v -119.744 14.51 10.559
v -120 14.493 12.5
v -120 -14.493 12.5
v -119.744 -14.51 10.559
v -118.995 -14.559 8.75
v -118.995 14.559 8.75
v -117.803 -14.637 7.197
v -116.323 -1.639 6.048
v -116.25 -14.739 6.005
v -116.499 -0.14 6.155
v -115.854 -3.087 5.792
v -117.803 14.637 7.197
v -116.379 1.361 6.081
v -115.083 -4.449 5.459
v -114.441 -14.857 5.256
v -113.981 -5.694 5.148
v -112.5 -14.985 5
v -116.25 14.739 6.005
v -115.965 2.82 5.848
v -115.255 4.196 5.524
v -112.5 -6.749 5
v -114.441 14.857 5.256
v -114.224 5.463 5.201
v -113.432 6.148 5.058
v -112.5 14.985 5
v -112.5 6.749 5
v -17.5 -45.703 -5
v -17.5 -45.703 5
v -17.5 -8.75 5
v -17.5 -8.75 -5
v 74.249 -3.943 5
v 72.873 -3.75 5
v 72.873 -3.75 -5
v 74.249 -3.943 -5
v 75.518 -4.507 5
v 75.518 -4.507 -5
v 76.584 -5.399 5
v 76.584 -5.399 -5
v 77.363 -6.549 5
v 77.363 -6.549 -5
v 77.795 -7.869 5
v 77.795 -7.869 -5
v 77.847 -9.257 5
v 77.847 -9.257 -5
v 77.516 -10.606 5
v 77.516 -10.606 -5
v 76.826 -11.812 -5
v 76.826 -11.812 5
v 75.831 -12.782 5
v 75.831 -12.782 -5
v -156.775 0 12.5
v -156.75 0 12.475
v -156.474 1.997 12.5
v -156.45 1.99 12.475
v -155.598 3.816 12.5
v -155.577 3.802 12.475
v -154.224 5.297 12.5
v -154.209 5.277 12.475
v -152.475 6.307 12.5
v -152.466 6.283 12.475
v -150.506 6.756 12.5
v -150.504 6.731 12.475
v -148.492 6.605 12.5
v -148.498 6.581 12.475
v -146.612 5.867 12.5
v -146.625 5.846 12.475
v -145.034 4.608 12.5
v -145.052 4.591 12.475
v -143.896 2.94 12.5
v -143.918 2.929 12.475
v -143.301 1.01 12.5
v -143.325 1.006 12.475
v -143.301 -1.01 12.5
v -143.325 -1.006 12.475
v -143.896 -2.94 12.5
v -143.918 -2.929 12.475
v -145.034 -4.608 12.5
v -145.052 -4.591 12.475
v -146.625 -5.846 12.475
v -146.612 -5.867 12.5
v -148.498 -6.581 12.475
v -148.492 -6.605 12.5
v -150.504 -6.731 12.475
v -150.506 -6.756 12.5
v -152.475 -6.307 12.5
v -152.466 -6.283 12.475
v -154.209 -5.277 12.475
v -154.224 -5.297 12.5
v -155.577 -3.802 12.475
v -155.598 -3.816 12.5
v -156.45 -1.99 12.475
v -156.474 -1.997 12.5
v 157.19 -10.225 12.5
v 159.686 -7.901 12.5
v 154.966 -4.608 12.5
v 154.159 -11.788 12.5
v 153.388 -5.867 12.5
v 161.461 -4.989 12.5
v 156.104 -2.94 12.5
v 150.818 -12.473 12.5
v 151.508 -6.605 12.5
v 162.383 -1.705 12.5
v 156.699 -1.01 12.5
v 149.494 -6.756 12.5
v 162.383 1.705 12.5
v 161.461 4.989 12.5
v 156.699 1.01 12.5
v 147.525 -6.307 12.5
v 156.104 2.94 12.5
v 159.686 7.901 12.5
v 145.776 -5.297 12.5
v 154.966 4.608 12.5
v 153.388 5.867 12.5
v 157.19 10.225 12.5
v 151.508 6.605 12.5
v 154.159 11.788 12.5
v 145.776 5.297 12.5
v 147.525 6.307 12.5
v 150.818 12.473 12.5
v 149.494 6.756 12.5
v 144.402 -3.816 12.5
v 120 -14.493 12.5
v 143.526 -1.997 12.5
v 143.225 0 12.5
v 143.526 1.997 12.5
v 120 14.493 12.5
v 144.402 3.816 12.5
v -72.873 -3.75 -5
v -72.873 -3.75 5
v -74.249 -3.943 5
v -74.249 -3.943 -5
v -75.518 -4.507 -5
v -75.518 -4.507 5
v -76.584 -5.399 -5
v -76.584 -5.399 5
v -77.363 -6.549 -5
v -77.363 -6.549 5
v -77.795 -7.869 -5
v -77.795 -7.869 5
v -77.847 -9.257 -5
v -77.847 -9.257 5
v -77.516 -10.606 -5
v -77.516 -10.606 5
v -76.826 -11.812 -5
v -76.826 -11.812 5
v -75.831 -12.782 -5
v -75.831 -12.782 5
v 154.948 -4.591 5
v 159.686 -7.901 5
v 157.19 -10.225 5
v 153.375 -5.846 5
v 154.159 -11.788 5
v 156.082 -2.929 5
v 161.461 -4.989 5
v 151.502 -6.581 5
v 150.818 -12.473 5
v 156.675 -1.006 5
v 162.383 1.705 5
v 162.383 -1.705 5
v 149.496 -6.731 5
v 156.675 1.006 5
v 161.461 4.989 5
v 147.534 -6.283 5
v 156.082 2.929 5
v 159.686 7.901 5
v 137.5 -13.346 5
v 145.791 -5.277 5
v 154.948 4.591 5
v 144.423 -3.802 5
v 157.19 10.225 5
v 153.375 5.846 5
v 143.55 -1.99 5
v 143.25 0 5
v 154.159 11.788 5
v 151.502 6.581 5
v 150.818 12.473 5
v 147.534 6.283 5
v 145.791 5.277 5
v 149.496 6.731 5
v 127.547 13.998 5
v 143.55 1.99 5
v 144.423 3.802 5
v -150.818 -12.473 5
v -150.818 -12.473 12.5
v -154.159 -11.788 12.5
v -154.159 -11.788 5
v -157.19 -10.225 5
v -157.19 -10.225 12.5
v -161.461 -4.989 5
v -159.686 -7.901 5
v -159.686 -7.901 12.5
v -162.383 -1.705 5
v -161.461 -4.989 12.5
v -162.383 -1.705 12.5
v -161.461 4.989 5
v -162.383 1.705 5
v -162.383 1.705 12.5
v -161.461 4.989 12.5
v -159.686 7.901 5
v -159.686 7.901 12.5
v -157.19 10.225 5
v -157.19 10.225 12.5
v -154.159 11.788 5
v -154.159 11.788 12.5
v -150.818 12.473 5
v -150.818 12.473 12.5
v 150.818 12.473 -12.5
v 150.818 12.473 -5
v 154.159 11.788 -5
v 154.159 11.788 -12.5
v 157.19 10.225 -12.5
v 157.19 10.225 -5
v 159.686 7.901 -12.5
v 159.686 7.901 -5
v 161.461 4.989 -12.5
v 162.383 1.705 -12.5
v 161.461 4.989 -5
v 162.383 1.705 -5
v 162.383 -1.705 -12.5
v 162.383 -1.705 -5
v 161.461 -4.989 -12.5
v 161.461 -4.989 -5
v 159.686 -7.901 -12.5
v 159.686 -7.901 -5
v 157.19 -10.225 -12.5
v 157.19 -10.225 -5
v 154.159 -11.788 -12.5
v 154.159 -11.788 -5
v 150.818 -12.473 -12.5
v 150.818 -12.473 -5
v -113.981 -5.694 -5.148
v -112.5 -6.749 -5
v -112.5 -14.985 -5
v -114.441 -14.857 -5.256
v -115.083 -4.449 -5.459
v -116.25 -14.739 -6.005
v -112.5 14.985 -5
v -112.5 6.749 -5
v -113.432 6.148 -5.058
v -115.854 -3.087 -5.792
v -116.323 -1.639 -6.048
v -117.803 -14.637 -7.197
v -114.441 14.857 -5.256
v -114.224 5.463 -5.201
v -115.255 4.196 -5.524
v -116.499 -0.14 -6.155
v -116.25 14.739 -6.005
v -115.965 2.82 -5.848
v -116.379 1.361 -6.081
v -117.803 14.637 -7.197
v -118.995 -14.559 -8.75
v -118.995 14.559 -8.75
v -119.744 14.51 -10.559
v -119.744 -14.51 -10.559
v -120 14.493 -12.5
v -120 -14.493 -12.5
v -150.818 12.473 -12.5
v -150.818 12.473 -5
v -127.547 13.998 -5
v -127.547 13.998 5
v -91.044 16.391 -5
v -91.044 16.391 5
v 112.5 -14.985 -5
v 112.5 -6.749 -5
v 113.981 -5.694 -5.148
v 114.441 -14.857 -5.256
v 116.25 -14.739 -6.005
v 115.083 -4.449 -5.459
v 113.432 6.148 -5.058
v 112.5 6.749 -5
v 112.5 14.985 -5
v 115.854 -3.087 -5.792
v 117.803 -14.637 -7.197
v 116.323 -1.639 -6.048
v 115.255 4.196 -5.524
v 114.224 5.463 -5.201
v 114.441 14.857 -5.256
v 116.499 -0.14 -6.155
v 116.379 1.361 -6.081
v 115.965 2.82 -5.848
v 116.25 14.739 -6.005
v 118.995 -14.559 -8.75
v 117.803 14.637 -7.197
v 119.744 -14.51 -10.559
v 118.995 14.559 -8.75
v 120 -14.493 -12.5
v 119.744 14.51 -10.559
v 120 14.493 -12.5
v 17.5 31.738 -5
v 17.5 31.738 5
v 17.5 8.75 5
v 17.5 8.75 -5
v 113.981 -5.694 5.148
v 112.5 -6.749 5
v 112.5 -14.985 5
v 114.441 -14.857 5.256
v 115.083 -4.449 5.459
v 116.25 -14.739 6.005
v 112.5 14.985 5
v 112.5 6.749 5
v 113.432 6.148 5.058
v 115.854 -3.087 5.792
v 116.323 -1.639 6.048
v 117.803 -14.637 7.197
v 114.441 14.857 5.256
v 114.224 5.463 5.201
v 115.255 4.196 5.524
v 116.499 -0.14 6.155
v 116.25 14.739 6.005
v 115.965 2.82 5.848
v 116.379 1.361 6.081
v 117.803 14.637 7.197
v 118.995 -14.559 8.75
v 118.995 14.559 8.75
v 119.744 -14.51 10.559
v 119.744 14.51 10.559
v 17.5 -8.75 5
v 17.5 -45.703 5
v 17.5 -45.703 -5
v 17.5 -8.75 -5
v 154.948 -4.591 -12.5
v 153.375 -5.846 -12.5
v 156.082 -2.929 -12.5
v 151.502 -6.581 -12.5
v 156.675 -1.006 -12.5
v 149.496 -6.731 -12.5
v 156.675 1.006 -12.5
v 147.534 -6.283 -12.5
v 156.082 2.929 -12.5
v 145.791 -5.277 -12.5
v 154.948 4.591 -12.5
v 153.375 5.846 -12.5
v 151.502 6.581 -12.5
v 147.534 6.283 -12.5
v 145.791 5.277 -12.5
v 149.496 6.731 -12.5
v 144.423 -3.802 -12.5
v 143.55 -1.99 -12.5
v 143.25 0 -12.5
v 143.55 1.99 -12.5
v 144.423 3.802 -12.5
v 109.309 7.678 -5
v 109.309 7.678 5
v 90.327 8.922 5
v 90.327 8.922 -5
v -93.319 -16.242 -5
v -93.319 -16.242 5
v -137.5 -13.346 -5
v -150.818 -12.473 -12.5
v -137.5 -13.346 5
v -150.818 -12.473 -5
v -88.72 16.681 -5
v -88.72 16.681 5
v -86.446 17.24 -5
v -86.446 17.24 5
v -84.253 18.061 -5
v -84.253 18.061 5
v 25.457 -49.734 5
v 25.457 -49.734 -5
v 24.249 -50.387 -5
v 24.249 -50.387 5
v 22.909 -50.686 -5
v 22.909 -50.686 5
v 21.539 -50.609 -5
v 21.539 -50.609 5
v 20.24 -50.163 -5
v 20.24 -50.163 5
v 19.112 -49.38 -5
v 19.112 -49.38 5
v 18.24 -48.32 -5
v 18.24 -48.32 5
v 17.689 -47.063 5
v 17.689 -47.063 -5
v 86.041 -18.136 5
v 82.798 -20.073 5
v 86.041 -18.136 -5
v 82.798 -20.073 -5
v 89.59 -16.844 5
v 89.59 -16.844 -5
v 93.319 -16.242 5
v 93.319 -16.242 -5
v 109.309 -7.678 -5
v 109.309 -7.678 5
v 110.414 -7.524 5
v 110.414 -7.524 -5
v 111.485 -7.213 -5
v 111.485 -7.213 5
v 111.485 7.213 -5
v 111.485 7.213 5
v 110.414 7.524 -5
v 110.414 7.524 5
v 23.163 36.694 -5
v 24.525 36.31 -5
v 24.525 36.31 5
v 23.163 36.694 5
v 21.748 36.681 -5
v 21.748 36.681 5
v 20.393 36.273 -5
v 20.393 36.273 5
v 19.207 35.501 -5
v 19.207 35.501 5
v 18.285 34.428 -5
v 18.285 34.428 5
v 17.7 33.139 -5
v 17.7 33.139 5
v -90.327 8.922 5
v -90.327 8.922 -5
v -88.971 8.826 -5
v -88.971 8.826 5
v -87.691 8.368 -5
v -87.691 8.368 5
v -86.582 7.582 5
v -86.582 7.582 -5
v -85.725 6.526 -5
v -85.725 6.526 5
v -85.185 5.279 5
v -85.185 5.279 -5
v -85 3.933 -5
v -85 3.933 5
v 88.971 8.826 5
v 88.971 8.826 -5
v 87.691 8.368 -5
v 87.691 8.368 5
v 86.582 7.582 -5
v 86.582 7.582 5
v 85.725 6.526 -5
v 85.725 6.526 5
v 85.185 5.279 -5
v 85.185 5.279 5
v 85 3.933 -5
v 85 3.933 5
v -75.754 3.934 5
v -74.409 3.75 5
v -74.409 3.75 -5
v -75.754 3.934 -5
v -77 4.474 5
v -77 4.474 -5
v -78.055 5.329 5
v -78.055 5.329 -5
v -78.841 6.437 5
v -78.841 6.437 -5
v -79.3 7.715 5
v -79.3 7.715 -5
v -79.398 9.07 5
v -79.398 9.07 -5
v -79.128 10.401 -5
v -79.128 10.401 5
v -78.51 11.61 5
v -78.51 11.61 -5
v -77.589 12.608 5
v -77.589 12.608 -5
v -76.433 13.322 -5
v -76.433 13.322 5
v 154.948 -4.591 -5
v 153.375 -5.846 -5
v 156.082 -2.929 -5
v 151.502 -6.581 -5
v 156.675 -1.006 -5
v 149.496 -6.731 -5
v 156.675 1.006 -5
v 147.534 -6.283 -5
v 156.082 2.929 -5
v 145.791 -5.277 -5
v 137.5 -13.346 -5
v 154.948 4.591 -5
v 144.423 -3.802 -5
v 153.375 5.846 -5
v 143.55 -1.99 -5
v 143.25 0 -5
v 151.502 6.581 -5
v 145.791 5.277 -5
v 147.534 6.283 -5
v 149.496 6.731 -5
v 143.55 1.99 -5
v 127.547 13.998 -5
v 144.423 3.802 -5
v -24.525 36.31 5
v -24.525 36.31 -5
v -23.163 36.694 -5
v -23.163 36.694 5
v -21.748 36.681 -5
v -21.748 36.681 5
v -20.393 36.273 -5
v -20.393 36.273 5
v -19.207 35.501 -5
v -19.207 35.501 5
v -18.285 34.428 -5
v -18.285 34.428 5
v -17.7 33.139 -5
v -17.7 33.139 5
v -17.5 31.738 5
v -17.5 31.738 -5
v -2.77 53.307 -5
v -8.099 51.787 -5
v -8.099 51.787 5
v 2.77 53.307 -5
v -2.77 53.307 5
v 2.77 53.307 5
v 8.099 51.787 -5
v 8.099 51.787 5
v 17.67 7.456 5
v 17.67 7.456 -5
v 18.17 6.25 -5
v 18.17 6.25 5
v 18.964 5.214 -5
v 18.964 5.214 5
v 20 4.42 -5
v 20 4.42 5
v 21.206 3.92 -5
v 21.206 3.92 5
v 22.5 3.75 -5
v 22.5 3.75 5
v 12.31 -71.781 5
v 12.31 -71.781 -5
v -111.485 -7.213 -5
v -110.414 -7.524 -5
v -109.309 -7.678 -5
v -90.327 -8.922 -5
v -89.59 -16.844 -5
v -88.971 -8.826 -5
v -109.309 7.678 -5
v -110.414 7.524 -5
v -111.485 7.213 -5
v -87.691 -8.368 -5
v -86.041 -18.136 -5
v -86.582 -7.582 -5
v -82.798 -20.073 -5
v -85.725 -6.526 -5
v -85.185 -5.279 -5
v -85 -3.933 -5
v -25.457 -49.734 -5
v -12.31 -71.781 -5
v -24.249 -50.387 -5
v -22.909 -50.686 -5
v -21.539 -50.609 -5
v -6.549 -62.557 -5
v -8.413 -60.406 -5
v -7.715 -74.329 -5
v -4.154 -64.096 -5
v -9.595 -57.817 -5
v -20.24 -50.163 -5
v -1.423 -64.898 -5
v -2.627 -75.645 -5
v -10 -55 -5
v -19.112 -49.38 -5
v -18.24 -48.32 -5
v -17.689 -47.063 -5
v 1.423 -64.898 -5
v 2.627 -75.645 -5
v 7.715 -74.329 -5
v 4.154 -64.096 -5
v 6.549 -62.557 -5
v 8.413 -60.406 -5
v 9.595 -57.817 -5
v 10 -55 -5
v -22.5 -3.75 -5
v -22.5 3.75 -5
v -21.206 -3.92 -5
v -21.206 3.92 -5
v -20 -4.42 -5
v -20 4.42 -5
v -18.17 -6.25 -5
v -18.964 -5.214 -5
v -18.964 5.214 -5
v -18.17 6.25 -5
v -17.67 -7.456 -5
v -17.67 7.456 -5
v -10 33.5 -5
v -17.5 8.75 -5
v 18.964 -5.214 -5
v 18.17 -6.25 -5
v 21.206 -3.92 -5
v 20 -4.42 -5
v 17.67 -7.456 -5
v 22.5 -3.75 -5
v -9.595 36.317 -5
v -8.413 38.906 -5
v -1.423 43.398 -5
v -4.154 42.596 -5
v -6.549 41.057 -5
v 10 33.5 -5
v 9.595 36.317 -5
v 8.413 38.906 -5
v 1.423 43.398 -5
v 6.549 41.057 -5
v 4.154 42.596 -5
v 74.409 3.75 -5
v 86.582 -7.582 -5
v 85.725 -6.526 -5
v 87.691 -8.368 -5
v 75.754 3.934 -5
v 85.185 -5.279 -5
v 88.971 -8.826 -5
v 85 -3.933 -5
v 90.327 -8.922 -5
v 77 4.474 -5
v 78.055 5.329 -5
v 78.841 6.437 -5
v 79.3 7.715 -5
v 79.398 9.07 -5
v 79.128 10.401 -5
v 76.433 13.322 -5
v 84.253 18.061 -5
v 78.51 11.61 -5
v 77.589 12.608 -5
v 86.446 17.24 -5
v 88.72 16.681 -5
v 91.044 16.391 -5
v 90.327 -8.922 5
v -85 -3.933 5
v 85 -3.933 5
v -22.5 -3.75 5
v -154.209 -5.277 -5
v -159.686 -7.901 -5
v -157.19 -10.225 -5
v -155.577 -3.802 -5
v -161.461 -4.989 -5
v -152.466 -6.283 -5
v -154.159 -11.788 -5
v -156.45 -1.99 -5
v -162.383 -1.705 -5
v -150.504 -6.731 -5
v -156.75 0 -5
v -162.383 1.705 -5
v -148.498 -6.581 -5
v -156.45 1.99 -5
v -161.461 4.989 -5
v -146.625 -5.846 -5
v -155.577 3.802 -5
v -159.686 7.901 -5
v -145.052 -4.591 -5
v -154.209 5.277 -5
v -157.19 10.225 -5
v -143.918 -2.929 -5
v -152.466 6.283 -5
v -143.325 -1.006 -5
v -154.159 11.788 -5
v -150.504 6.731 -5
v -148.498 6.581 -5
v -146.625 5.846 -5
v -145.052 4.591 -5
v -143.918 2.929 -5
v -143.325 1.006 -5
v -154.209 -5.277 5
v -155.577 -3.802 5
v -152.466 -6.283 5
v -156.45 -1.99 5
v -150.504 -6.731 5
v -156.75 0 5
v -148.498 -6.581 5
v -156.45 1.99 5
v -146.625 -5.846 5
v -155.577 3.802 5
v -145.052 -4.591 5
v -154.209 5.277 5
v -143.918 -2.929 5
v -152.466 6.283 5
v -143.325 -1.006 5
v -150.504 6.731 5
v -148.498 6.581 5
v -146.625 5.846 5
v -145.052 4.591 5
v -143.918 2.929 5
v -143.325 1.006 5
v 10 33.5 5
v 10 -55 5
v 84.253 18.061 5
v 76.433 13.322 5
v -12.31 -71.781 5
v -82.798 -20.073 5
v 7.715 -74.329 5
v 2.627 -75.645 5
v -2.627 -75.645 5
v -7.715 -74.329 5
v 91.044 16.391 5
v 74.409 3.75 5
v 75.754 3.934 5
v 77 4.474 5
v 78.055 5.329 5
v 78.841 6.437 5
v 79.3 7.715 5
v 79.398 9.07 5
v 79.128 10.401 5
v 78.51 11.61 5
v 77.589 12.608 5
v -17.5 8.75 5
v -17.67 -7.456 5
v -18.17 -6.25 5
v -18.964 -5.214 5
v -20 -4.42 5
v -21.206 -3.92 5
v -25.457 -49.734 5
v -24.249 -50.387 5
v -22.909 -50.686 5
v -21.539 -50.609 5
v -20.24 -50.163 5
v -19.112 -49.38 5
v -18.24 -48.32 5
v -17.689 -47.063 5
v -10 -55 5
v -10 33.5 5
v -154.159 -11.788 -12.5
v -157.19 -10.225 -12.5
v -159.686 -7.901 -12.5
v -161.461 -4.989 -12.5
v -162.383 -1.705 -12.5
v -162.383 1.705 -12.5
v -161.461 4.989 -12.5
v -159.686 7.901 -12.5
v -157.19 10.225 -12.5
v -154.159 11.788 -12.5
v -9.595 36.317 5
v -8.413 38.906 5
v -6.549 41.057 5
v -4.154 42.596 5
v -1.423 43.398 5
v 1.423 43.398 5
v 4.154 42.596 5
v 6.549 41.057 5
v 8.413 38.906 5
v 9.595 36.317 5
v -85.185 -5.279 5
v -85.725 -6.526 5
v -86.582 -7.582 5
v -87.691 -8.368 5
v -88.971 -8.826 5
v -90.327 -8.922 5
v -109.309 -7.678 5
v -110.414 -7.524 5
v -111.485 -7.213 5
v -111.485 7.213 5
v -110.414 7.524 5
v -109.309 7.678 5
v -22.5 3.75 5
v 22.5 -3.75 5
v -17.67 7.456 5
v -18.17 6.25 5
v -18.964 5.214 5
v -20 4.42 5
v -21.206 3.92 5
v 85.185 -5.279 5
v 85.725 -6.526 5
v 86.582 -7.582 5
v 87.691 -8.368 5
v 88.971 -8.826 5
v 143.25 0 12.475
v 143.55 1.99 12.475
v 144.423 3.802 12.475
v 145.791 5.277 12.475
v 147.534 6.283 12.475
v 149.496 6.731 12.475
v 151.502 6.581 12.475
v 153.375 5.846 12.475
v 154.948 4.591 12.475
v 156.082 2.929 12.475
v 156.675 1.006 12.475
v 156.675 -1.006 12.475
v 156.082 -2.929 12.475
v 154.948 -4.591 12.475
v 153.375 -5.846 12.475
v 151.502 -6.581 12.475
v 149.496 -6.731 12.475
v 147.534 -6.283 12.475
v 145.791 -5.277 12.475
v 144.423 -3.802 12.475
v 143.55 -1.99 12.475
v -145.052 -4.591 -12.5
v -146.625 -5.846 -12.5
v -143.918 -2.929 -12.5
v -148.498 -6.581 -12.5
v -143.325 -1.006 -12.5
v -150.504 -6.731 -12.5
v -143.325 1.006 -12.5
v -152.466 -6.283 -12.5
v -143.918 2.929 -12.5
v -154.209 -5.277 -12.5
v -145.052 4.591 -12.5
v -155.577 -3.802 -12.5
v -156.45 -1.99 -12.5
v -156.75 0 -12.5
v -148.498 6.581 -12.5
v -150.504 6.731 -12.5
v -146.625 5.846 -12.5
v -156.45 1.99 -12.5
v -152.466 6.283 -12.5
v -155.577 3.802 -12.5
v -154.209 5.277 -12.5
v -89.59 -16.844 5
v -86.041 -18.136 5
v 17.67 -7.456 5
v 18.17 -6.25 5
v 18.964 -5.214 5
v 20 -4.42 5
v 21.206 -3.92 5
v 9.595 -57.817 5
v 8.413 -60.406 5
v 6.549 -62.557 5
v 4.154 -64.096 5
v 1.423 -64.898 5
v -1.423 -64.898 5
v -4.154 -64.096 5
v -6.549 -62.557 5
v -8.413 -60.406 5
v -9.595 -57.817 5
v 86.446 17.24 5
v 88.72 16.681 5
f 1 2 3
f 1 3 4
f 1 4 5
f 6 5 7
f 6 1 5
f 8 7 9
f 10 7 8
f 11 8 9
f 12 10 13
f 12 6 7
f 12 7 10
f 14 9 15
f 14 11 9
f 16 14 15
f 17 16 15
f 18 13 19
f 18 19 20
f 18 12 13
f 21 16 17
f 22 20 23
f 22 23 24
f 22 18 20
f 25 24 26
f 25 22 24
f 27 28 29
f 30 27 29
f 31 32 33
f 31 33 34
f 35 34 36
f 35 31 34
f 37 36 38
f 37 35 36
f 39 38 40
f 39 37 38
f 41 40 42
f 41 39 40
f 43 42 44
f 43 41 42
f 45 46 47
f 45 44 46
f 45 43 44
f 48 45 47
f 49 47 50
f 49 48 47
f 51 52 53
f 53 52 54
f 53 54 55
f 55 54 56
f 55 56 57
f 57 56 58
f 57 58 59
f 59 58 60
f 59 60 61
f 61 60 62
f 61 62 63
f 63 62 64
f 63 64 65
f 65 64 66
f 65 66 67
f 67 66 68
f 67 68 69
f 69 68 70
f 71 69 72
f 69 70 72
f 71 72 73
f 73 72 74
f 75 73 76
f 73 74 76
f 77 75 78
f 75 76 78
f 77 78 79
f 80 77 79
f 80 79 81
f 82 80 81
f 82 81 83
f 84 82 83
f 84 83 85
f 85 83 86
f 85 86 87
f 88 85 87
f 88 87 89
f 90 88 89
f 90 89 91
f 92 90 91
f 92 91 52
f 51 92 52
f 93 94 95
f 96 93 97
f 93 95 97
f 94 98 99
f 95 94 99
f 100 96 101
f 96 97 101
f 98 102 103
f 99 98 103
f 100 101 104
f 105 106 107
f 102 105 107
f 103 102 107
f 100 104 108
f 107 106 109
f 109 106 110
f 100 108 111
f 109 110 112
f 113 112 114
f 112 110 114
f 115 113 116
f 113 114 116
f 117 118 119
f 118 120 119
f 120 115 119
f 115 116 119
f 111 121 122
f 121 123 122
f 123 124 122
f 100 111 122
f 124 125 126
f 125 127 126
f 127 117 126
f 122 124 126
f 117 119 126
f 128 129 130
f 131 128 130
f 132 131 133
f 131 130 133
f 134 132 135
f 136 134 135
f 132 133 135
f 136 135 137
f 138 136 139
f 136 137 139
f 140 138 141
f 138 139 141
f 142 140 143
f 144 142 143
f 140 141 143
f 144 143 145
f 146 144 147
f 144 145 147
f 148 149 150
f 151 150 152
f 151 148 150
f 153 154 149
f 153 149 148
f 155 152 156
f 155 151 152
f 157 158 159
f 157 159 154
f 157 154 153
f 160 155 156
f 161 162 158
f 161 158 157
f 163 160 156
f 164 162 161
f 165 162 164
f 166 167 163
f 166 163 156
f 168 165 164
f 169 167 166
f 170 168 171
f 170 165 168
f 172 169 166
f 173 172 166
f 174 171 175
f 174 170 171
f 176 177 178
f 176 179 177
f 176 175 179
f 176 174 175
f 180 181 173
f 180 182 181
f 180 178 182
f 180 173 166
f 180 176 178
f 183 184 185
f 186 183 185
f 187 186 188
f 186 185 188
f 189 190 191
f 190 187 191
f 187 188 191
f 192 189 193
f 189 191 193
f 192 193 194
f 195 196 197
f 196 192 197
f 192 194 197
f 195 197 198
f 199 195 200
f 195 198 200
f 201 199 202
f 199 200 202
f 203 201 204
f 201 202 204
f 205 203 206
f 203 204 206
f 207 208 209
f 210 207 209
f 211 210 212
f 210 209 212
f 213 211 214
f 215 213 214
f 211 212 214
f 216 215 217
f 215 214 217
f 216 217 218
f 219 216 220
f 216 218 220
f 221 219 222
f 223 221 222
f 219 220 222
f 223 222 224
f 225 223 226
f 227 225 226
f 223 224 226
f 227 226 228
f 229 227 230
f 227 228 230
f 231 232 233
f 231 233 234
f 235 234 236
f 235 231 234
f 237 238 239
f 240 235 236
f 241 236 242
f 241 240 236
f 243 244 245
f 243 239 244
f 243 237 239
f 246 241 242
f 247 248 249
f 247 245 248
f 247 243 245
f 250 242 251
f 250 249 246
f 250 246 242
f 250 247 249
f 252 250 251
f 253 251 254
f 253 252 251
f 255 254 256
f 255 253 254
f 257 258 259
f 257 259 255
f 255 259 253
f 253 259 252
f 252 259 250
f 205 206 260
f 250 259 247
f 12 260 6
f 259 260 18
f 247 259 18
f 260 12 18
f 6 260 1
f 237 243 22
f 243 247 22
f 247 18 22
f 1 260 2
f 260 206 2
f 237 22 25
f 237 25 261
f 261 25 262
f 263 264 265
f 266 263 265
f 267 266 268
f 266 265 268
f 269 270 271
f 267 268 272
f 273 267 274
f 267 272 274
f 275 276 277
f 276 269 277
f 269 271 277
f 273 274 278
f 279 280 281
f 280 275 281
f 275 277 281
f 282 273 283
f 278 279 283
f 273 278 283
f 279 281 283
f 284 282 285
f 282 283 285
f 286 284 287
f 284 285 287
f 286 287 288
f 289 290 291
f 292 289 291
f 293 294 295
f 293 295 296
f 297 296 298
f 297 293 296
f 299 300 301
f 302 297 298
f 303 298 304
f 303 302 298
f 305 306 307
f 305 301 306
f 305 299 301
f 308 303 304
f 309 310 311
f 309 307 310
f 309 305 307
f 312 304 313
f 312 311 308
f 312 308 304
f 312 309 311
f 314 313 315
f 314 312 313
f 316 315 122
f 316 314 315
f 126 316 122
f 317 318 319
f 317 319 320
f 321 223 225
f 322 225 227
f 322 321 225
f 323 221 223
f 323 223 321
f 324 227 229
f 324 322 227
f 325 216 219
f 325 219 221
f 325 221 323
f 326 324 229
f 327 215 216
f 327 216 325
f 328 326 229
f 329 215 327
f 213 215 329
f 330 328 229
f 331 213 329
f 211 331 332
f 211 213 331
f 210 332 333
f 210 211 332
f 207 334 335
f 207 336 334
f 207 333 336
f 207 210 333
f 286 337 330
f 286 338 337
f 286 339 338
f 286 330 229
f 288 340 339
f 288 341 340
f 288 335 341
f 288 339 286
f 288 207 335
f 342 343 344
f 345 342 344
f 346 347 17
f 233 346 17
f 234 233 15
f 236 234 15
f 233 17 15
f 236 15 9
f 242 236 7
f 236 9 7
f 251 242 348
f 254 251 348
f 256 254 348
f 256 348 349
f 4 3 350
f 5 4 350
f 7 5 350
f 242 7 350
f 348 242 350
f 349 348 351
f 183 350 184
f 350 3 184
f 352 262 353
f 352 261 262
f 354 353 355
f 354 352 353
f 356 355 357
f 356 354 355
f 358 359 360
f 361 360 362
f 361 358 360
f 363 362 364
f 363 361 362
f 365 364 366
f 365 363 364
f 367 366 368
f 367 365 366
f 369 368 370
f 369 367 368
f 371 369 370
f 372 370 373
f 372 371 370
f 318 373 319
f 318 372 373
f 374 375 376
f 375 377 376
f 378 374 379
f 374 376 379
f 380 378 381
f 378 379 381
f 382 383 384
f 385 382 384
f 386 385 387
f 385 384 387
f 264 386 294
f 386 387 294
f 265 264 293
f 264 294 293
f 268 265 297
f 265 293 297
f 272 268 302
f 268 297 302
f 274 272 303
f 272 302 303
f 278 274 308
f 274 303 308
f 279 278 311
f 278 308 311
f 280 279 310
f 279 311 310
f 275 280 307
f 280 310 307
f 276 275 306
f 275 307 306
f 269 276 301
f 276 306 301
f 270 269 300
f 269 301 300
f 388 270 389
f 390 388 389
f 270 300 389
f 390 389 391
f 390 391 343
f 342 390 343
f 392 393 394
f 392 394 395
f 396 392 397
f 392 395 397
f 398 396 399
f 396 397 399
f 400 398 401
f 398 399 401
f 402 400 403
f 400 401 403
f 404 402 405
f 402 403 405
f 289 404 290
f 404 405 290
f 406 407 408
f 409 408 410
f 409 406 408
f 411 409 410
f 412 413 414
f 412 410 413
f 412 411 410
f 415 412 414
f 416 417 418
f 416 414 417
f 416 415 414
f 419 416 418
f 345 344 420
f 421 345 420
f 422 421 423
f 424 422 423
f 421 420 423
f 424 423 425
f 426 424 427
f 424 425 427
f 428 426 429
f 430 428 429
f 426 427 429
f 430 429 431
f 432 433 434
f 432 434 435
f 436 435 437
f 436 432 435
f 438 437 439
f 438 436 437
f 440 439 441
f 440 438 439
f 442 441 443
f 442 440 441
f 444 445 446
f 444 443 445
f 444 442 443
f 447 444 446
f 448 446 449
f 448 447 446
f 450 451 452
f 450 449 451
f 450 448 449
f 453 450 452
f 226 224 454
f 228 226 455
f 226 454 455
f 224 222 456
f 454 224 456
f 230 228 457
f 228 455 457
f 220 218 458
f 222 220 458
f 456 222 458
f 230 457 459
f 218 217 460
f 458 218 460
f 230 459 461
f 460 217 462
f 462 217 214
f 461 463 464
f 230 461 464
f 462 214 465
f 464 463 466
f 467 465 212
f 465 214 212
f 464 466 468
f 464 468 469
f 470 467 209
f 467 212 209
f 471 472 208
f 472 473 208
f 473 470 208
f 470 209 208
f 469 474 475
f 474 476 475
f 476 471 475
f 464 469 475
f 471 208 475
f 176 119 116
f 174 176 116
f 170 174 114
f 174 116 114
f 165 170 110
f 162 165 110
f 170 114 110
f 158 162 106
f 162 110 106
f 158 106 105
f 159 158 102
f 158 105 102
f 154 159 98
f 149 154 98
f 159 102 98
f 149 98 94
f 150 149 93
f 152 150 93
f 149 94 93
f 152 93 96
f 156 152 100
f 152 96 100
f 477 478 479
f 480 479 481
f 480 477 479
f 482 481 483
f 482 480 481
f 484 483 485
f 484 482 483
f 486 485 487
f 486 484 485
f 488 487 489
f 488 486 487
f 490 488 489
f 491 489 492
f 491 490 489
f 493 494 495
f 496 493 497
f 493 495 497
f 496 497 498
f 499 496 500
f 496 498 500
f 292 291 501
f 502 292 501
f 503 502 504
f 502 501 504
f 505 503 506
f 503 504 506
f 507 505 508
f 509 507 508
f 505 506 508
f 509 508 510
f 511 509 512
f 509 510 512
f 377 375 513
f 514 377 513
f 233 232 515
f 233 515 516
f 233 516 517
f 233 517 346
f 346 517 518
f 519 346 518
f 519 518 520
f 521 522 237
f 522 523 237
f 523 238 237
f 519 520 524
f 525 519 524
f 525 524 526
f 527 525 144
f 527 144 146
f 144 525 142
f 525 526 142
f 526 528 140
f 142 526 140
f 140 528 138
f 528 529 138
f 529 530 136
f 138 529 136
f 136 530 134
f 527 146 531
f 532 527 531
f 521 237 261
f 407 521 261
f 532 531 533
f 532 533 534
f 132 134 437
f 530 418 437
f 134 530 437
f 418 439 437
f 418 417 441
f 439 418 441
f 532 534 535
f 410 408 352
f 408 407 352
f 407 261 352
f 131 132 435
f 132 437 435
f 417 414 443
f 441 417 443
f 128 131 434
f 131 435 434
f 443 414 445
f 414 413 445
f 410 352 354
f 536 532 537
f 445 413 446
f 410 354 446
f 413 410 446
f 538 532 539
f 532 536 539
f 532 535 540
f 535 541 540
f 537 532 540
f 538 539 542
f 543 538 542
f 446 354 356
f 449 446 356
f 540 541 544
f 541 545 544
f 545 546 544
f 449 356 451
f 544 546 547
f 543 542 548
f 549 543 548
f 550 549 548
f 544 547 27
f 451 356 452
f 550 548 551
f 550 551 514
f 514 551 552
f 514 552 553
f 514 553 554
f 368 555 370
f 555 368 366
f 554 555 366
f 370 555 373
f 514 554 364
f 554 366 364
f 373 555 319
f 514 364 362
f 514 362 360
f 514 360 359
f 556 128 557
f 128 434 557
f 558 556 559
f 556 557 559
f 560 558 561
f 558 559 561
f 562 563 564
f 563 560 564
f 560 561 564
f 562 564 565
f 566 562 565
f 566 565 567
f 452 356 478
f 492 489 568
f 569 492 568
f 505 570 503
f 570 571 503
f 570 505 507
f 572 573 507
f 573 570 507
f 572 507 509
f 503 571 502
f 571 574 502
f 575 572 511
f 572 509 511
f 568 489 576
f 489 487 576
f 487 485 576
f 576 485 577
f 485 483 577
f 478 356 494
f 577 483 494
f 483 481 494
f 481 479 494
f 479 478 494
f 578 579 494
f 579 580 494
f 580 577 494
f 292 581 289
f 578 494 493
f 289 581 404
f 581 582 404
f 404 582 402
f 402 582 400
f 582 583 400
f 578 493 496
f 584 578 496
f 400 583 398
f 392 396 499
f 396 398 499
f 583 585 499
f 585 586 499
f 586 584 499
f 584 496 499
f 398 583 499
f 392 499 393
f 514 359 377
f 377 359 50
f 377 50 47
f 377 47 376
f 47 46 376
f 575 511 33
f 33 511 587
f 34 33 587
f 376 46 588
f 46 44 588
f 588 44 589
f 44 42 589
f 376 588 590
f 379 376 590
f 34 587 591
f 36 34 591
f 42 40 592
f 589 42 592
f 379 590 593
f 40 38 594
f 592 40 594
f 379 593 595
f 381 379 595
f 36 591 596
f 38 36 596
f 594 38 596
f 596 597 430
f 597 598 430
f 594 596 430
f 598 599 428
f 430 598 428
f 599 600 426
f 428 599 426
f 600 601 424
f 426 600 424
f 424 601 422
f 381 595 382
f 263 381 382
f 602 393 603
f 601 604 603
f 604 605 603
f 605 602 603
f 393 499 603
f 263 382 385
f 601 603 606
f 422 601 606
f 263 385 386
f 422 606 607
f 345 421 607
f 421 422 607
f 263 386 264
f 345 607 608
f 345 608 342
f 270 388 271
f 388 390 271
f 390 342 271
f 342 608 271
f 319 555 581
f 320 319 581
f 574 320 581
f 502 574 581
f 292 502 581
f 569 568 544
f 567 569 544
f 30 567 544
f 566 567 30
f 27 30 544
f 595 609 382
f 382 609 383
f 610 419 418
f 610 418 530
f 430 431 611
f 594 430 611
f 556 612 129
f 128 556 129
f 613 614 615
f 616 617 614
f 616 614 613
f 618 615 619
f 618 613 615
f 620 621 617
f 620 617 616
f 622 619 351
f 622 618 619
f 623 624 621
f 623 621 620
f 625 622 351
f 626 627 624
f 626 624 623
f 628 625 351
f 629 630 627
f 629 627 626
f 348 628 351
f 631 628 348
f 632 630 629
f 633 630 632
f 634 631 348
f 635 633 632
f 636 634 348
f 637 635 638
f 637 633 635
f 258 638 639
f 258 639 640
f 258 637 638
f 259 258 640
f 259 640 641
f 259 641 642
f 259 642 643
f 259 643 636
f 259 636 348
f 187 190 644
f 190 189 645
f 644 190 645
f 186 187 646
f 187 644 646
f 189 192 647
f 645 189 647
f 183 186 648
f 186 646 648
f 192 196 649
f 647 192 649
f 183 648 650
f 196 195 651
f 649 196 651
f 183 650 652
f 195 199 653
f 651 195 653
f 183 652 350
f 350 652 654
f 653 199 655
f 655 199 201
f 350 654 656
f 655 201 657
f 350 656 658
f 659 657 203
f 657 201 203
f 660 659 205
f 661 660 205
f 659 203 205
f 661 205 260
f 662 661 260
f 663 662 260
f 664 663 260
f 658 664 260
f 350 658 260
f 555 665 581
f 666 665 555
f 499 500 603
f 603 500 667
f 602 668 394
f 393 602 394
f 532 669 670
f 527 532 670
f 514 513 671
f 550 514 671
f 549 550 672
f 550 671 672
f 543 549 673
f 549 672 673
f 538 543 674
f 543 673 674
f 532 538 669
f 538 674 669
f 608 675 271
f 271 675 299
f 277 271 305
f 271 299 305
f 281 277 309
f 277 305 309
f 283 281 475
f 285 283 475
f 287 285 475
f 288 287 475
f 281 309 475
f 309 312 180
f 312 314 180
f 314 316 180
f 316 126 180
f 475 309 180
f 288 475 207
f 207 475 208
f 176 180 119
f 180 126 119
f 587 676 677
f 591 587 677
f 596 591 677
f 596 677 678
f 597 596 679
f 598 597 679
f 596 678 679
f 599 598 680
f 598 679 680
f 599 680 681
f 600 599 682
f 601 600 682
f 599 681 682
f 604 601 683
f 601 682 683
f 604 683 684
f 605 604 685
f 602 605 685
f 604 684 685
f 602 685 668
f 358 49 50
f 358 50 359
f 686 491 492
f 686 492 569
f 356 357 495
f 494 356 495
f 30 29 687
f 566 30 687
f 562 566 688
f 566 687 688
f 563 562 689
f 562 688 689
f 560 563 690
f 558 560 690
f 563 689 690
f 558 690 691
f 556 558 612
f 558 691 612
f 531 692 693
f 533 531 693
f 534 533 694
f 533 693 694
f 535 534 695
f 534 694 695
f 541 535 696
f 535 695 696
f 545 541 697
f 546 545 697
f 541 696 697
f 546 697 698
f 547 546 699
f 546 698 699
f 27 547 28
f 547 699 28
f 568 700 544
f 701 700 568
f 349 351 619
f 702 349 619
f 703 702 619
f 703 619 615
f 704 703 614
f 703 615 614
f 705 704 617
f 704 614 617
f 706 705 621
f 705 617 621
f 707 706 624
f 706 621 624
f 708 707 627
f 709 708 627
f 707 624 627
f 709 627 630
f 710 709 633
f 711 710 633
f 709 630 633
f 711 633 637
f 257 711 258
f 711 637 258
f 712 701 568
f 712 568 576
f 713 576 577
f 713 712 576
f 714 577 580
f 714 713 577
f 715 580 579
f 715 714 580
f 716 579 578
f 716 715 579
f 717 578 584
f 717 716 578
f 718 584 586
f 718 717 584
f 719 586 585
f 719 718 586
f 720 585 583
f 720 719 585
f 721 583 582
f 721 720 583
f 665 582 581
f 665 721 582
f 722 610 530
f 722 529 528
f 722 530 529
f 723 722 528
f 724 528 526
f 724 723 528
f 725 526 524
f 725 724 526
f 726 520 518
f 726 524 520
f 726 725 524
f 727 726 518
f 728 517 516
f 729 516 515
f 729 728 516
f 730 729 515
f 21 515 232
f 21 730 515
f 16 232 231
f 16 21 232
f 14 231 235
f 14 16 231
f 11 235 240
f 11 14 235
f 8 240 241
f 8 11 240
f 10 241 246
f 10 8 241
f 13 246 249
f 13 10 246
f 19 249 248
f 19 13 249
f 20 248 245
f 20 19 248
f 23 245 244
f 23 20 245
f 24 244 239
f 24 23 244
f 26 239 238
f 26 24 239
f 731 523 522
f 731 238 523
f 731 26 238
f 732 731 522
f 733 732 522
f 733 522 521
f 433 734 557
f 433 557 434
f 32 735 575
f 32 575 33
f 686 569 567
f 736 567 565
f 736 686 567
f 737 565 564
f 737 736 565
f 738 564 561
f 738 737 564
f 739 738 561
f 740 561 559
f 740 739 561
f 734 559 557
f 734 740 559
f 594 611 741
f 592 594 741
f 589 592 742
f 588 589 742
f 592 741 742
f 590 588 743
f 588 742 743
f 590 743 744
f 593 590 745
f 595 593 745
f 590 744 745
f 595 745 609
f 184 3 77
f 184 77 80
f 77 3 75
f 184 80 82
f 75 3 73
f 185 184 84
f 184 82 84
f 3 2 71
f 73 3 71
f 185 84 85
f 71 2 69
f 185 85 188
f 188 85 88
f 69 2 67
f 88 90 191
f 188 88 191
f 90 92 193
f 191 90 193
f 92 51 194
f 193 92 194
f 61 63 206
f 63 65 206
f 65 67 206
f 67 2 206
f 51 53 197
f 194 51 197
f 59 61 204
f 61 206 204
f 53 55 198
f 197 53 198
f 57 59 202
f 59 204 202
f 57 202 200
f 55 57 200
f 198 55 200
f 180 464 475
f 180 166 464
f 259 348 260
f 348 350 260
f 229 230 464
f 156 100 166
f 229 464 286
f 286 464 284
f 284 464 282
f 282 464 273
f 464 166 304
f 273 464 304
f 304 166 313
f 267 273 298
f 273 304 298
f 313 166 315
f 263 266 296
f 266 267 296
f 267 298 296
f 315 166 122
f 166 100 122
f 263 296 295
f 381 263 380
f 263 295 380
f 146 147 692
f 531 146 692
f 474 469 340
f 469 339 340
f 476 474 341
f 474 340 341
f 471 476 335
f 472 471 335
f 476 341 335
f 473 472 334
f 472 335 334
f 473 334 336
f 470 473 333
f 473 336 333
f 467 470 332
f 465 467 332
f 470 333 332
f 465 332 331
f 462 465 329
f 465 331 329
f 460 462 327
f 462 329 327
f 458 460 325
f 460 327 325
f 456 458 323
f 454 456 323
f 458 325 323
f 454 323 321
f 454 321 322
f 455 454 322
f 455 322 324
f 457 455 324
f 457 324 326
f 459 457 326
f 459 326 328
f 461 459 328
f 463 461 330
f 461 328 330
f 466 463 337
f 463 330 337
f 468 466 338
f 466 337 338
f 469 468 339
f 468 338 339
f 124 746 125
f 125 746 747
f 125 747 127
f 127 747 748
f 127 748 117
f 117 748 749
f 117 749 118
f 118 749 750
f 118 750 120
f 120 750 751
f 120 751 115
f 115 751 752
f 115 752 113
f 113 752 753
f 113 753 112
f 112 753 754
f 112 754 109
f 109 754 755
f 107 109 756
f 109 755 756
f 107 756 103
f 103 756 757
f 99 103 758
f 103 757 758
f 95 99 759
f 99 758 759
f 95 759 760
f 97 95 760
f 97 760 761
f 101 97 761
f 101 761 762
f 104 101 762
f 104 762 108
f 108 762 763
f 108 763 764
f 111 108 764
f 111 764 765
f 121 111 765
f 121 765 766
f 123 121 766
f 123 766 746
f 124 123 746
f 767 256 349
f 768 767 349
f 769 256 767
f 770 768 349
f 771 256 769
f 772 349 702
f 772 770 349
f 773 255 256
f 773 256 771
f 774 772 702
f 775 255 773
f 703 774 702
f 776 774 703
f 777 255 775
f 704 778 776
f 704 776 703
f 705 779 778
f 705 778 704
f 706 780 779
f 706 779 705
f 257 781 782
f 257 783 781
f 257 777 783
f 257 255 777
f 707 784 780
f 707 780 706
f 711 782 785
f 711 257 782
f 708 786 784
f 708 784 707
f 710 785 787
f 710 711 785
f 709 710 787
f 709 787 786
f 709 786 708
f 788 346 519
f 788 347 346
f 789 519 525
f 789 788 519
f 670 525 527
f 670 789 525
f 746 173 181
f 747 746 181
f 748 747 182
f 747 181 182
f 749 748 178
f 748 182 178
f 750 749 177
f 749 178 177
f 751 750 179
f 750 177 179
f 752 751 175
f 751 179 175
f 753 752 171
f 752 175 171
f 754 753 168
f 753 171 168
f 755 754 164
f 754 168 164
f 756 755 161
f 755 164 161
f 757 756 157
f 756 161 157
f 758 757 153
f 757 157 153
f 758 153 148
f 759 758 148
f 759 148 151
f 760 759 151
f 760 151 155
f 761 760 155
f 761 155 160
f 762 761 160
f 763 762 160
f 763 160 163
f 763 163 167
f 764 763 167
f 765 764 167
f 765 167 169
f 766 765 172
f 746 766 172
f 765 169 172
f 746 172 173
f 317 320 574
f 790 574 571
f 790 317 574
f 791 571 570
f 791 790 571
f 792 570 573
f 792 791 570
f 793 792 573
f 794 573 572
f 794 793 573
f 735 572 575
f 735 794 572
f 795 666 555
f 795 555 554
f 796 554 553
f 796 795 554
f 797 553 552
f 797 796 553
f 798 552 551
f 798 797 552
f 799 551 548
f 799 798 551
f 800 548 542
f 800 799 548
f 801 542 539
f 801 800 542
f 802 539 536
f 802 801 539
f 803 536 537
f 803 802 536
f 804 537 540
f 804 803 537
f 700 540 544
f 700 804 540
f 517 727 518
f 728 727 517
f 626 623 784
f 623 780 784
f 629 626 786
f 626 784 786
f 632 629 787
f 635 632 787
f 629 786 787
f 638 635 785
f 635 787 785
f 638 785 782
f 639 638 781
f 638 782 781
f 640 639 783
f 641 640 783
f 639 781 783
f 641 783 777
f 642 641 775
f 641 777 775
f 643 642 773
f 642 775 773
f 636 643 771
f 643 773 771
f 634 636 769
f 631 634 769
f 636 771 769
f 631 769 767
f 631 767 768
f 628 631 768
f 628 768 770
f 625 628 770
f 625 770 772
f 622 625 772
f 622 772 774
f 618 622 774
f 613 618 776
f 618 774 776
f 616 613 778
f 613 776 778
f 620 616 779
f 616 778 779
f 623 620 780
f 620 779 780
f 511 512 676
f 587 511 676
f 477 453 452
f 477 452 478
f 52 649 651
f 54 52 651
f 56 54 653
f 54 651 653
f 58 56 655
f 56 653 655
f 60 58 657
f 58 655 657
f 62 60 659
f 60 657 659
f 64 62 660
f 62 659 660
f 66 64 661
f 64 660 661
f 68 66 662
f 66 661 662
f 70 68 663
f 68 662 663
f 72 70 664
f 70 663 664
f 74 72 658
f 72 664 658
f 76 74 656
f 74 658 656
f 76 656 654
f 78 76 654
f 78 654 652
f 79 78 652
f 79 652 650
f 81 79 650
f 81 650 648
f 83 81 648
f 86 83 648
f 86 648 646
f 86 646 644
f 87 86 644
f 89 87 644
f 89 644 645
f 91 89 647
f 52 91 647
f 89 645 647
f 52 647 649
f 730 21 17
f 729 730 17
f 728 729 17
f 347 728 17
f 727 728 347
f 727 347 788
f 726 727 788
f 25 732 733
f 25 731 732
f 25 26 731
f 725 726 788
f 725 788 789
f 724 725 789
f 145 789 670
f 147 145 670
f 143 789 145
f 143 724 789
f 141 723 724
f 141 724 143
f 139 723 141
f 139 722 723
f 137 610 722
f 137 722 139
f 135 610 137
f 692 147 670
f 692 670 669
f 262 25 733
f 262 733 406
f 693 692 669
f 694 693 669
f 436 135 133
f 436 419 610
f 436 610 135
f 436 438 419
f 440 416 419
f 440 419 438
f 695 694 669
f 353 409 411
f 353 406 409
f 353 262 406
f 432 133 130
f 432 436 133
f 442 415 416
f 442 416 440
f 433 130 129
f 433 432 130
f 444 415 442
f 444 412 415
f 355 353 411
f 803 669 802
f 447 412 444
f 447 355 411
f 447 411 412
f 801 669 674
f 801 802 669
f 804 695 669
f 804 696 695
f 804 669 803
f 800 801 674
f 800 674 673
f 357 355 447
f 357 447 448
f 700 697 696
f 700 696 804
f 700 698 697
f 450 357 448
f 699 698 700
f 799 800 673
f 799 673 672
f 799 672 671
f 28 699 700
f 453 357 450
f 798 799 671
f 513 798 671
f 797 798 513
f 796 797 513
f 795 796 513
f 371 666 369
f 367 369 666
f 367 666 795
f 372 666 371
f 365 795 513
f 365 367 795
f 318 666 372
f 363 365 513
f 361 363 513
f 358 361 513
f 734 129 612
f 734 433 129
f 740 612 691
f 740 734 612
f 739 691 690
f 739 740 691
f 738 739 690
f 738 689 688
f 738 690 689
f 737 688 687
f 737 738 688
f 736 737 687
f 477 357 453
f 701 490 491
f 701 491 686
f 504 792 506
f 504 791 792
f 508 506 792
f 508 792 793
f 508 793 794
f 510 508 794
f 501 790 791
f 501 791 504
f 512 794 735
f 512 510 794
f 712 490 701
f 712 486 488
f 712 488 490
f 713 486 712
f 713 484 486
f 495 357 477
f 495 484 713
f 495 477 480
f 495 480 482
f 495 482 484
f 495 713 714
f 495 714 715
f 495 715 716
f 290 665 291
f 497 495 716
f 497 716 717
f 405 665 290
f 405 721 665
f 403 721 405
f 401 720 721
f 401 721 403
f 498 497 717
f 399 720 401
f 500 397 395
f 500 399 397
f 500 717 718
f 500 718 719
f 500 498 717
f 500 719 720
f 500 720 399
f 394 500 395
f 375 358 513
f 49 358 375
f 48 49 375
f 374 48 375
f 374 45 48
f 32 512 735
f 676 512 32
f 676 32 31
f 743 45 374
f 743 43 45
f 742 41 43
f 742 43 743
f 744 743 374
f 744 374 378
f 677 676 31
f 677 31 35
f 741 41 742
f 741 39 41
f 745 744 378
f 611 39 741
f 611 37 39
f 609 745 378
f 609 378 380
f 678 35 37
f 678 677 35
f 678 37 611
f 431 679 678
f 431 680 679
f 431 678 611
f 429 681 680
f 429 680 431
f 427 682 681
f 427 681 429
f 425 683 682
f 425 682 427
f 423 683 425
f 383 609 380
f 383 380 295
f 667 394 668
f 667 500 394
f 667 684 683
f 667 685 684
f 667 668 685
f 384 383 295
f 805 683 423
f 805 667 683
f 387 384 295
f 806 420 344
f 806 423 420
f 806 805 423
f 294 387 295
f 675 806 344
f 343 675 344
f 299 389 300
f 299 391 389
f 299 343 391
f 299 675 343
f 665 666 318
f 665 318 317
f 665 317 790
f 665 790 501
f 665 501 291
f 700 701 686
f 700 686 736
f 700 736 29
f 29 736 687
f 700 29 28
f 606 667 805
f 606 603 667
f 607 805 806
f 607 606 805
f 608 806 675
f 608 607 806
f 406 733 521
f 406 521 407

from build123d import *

# Parameters (mm, degrees)
BOSS_EXTRUDE1_DEPTH                    = 12.5
SKETCH2_W                              = 240
SKETCH2_H                              = 181.658858688
CUT_EXTRUDE1_DEPTH                     = 7.5
F_13_5_13_5_DIAMETER_HOLE1_D           = 13.5
F_13_5_13_5_DIAMETER_HOLE1_CSINK_D     = 13.55
F_13_5_13_5_DIAMETER_HOLE1_CSINK_ANGLE = 90
CUT_EXTRUDE2_DEPTH                     = 5
FILLET1_R                              = 7.5
FILLET2_R                              = 20
CUT_EXTRUDE3_DEPTH                     = 181.166481325
CUT_EXTRUDE4_DEPTH                     = 181.166481325
CUT_EXTRUDE5_DEPTH                     = 181.166481325


with BuildPart() as part:
    # Sketch1 → Boss-Extrude1 (new, symmetric)
    with BuildSketch(Plane.XY):
        with BuildLine():
            Line((-150.817539115, 12.47323654), (-87.5, 16.623287311))
            Line((-87.5, 16.623287311), (-8.098559617, 51.78697165))
            ThreePointArc((-8.098559617, 51.78697165), (0, 53.5), (8.098559617, 51.78697165))
            Line((8.098559617, 51.78697165), (87.5, 16.623287311))
            Line((87.5, 16.623287311), (150.817539115, 12.47323654))
            ThreePointArc((150.817539115, 12.47323654), (162.5, 0), (150.817539115, -12.47323654))
            Line((150.817539115, -12.47323654), (87.5, -16.623287311))
            Line((87.5, -16.623287311), (12.310141778, -71.78094771))
            ThreePointArc((12.310141778, -71.78094771), (0, -75.812010875), (-12.310141778, -71.78094771))
            Line((-12.310141778, -71.78094771), (-87.5, -16.623287311))
            Line((-87.5, -16.623287311), (-150.817539115, -12.47323654))
            ThreePointArc((-150.817539115, -12.47323654), (-162.5, 0), (-150.817539115, 12.47323654))
        make_face()
    extrude(amount=BOSS_EXTRUDE1_DEPTH, both=True)

    # Sketch2 → Cut-Extrude1 (cut)
    with BuildSketch(Plane.XY.offset(12.5)):
        Rectangle(SKETCH2_W, SKETCH2_H)
    cut_extrude1 = extrude(amount=-CUT_EXTRUDE1_DEPTH, mode=Mode.SUBTRACT)

    # Mirror2: Cut-Extrude1 across plane
    add(cut_extrude1.mirror(Plane.XY), mode=Mode.SUBTRACT)

    # Ø13.5 (13.5) Diameter Hole1 (through all)
    with Locations(Plane.XY.offset(12.5)):
        with Locations((-150, 0), (150, 0)):
            CounterSinkHole(F_13_5_13_5_DIAMETER_HOLE1_D / 2, F_13_5_13_5_DIAMETER_HOLE1_CSINK_D / 2, counter_sink_angle=F_13_5_13_5_DIAMETER_HOLE1_CSINK_ANGLE)

    # Sketch5 → Cut-Extrude2 (cut, symmetric)
    with BuildSketch(Plane.XY):
        with BuildLine():
            Line((-137.5, -13.34611417), (-127.54739536, 13.998442342))
            Line((-127.54739536, 13.998442342), (-150.817539115, 12.47323654))
            ThreePointArc((-150.817539115, 12.47323654), (-162.5, 0), (-150.817539115, -12.47323654))
            Line((-150.817539115, -12.47323654), (-137.5, -13.34611417))
        make_face()
    cut_extrude2 = extrude(amount=CUT_EXTRUDE2_DEPTH, both=True, mode=Mode.SUBTRACT)

    # Mirror3: Cut-Extrude2 across plane
    add(cut_extrude2.mirror(Plane(origin=(0, 0, 0), x_dir=(0, 0, 1), z_dir=(1, 0, 0))), mode=Mode.SUBTRACT)

    # Fillet1
    fillet1_edges = [part.edges().sort_by_distance(p)[0] for p in [
        (120, 0, -5),
        (120, 0, 5),
        (-120, 0, -5),
        (-120, 0, 5),
    ]]
    fillet(fillet1_edges, radius=FILLET1_R - 0.0001)  # a hair under: the kernel refuses the full size

    # Fillet2
    fillet2_edges = [part.edges().sort_by_distance(p)[0] for p in [
        (-87.5, 16.623287311, 0),
        (87.5, 16.623287311, 0),
        (87.5, -16.623287311, 0),
        (-87.5, -16.623287311, 0),
    ]]
    fillet(fillet2_edges, radius=FILLET2_R)

    # Sketch6 → Cut-Extrude3 (cut, through all)
    with BuildSketch(Plane.XY.offset(5)):
        with BuildLine():
            Line((10, 33.5), (10, -55))
            ThreePointArc((10, -55), (0, -65), (-10, -55))
            Line((-10, -55), (-10, 33.5))
            ThreePointArc((-10, 33.5), (0, 43.5), (10, 33.5))
        make_face()
    extrude(amount=-CUT_EXTRUDE3_DEPTH, mode=Mode.SUBTRACT)

    # Sketch7 → Cut-Extrude4 (cut, through all)
    with BuildSketch(Plane.XY.offset(5)):
        with BuildLine():
            Line((76.433247958, 13.321742913), (24.524639904, 36.309964527))
            ThreePointArc((24.524639904, 36.309964527), (19.772656927, 35.928877859), (17.5, 31.738221615))
            Line((17.5, 31.738221615), (17.5, 8.75))
            ThreePointArc((17.5, 8.75), (18.964466094, 5.214466094), (22.5, 3.75))
            Line((22.5, 3.75), (74.408608053, 3.75))
            ThreePointArc((74.408608053, 3.75), (79.300372283, 7.715281334), (76.433247958, 13.321742913))
        make_face()
        with BuildLine():
            Line((75.830583045, -12.781553657), (25.457460923, -49.734191007))
            ThreePointArc((25.457460923, -49.734191007), (20.240277076, -50.162867423), (17.5, -45.70263735))
            Line((17.5, -45.70263735), (17.5, -8.75))
            ThreePointArc((17.5, -8.75), (18.964466094, -5.214466094), (22.5, -3.75))
            Line((22.5, -3.75), (72.873122122, -3.75))
            ThreePointArc((72.873122122, -3.75), (77.624846456, -7.194006473), (75.830583045, -12.781553657))
        make_face()
    cut_extrude4 = extrude(amount=-CUT_EXTRUDE4_DEPTH, mode=Mode.SUBTRACT)

    # Mirror4: Cut-Extrude4 across plane
    add(cut_extrude4.mirror(Plane(origin=(0, 0, 0), x_dir=(0, 0, 1), z_dir=(1, 0, 0))), mode=Mode.SUBTRACT)

    # Sketch8 → Cut-Extrude5 (cut, symmetric)
    with BuildSketch(Plane.XY.offset(5)):
        with BuildLine():
            Line((-109.308995171, 7.677757716), (-90.327015646, 8.921902385))
            ThreePointArc((-90.327015646, 8.921902385), (-86.58203849, 7.581928132), (-85, 3.932607769))
            Line((-85, 3.932607769), (-85, -3.932607769))
            ThreePointArc((-85, -3.932607769), (-86.58203849, -7.581928132), (-90.327015646, -8.921902385))
            Line((-90.327015646, -8.921902385), (-109.308995171, -7.677757716))
            ThreePointArc((-109.308995171, -7.677757716), (-116.5, 0), (-109.308995171, 7.677757716))
        make_face()
    cut_extrude5 = extrude(amount=CUT_EXTRUDE5_DEPTH, both=True, mode=Mode.SUBTRACT)

    # Mirror5: Cut-Extrude5 across plane
    add(cut_extrude5.mirror(Plane(origin=(0, 0, 0), x_dir=(0, 0, 1), z_dir=(1, 0, 0))), mode=Mode.SUBTRACT)


solid = part.part
